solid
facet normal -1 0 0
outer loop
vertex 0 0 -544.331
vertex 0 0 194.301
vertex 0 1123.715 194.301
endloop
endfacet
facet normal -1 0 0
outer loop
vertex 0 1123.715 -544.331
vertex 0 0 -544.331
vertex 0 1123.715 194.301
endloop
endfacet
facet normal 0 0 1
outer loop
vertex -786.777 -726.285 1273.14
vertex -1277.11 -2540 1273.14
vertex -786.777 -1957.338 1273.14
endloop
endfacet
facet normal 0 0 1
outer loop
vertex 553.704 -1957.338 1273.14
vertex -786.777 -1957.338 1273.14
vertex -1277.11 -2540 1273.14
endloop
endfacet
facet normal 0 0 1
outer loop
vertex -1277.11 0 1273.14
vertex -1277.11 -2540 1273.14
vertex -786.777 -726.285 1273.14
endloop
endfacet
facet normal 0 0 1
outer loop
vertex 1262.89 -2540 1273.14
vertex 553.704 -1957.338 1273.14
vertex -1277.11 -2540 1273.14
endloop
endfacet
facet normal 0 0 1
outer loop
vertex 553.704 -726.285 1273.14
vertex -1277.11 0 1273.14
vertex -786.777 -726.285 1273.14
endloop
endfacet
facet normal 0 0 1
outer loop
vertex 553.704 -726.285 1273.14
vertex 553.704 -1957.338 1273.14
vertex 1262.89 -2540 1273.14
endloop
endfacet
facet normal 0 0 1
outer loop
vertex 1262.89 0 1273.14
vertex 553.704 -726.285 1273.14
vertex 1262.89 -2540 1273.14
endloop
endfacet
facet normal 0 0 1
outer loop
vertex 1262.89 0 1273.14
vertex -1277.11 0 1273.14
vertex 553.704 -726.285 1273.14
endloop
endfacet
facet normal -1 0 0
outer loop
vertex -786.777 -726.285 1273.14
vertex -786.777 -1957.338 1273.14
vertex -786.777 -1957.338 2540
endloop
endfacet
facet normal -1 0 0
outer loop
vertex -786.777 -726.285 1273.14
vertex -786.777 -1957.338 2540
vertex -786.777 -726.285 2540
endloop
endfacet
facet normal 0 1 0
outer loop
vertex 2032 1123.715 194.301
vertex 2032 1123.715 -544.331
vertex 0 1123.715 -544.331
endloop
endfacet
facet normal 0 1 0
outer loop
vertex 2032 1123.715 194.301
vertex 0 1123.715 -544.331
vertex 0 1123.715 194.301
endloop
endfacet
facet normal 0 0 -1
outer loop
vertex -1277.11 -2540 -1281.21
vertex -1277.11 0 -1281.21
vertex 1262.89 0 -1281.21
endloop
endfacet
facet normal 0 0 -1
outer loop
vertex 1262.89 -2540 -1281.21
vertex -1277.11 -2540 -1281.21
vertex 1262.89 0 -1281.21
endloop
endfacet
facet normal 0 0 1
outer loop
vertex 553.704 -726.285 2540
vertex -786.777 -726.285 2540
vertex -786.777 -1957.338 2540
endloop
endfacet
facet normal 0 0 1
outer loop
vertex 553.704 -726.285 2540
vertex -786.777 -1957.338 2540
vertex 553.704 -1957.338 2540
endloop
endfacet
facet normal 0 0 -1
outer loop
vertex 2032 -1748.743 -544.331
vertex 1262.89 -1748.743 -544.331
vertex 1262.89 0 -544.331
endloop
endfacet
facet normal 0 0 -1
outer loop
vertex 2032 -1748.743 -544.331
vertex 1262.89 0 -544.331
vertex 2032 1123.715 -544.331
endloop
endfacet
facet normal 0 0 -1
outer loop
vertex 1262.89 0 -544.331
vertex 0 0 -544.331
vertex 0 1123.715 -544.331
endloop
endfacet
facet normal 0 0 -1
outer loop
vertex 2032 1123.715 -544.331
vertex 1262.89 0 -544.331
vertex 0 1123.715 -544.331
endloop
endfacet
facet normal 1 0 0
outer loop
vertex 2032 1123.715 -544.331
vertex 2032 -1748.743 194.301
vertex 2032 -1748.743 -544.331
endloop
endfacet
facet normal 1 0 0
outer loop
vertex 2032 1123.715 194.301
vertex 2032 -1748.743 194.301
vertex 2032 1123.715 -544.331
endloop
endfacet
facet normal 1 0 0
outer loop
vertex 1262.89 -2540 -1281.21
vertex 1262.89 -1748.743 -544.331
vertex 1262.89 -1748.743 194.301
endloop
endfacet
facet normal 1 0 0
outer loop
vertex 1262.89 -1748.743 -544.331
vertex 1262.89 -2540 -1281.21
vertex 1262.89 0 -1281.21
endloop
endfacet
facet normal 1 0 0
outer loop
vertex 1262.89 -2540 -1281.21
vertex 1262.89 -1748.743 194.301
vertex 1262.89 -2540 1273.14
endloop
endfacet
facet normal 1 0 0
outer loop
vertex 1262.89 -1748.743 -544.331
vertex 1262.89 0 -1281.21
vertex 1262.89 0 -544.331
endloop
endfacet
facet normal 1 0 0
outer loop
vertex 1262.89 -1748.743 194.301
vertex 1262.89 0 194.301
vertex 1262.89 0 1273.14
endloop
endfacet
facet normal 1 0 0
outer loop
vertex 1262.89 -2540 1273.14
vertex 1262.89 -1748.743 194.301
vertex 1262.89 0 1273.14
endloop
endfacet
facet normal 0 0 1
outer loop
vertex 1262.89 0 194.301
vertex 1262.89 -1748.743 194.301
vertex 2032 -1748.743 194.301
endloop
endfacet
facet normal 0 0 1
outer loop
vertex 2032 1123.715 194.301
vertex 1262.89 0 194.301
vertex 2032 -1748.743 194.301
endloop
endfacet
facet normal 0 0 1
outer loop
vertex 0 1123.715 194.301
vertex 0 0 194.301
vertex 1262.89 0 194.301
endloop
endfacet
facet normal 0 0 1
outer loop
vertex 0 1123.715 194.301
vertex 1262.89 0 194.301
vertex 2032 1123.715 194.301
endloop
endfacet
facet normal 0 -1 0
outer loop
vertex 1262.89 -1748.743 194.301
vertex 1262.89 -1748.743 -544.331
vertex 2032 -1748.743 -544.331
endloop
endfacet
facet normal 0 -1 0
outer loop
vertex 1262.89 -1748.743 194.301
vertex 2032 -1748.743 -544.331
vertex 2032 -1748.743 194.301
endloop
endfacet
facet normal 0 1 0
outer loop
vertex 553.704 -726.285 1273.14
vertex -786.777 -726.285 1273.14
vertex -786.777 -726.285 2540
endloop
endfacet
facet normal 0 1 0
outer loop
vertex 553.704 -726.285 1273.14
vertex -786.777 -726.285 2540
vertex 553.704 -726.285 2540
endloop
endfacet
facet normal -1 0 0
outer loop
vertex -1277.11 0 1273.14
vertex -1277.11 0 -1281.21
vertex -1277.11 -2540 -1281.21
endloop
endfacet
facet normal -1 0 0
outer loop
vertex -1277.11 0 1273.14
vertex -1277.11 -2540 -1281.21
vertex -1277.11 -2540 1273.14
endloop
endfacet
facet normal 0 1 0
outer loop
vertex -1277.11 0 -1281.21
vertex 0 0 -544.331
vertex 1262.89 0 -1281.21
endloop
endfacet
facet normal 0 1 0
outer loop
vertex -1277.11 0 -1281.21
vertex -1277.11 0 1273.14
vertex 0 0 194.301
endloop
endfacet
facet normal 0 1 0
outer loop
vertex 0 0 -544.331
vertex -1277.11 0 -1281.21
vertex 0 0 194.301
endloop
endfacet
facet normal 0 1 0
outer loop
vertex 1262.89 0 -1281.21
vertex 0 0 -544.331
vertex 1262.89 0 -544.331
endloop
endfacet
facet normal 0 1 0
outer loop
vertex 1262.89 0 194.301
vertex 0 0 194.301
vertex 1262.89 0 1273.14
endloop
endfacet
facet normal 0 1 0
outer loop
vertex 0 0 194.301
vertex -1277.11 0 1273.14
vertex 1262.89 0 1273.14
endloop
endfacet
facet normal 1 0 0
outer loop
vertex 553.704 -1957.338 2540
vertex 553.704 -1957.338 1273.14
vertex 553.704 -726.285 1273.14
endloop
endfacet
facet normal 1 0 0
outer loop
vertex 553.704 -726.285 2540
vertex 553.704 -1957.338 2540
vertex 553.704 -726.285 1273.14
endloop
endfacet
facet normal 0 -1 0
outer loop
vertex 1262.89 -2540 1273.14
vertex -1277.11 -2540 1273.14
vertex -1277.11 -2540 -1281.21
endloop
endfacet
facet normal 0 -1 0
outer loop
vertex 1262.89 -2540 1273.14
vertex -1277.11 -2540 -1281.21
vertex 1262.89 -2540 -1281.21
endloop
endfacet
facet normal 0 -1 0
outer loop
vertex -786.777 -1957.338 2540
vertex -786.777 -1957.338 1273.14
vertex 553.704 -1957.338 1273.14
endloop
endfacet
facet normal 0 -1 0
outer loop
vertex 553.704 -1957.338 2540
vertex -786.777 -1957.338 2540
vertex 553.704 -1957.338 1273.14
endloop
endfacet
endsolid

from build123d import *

# Parameters (mm, degrees)
F0_W     = 2540
F0_H     = 2554.350389
F1_DEPTH = 2540
F2_W     = 1340.480209
F2_H     = 1231.053293
F3_DEPTH = 2540
F4_W     = 2872.457623
F4_H     = 738.631963
F5_DEPTH = 2032


with BuildPart() as f1:
    # F0 (on Front) → F1 (new body)
    with BuildSketch(Plane.XZ):
        with Locations((-7.109645, -4.035211)):
            Rectangle(F0_W, F0_H)
    extrude(amount=F1_DEPTH)

    # F2 (on Top) → F3 (join)
    with BuildSketch(Plane.XY):
        with Locations((-116.536558, -1341.811448)):
            Rectangle(F2_W, F2_H)
    extrude(amount=F3_DEPTH)

    # F4 (on Right) → F5 (join)
    with BuildSketch(Plane.YZ):
        with Locations((-312.514126, -175.014854)):
            Rectangle(F4_W, F4_H)
    extrude(amount=F5_DEPTH)


solid = f1.part
